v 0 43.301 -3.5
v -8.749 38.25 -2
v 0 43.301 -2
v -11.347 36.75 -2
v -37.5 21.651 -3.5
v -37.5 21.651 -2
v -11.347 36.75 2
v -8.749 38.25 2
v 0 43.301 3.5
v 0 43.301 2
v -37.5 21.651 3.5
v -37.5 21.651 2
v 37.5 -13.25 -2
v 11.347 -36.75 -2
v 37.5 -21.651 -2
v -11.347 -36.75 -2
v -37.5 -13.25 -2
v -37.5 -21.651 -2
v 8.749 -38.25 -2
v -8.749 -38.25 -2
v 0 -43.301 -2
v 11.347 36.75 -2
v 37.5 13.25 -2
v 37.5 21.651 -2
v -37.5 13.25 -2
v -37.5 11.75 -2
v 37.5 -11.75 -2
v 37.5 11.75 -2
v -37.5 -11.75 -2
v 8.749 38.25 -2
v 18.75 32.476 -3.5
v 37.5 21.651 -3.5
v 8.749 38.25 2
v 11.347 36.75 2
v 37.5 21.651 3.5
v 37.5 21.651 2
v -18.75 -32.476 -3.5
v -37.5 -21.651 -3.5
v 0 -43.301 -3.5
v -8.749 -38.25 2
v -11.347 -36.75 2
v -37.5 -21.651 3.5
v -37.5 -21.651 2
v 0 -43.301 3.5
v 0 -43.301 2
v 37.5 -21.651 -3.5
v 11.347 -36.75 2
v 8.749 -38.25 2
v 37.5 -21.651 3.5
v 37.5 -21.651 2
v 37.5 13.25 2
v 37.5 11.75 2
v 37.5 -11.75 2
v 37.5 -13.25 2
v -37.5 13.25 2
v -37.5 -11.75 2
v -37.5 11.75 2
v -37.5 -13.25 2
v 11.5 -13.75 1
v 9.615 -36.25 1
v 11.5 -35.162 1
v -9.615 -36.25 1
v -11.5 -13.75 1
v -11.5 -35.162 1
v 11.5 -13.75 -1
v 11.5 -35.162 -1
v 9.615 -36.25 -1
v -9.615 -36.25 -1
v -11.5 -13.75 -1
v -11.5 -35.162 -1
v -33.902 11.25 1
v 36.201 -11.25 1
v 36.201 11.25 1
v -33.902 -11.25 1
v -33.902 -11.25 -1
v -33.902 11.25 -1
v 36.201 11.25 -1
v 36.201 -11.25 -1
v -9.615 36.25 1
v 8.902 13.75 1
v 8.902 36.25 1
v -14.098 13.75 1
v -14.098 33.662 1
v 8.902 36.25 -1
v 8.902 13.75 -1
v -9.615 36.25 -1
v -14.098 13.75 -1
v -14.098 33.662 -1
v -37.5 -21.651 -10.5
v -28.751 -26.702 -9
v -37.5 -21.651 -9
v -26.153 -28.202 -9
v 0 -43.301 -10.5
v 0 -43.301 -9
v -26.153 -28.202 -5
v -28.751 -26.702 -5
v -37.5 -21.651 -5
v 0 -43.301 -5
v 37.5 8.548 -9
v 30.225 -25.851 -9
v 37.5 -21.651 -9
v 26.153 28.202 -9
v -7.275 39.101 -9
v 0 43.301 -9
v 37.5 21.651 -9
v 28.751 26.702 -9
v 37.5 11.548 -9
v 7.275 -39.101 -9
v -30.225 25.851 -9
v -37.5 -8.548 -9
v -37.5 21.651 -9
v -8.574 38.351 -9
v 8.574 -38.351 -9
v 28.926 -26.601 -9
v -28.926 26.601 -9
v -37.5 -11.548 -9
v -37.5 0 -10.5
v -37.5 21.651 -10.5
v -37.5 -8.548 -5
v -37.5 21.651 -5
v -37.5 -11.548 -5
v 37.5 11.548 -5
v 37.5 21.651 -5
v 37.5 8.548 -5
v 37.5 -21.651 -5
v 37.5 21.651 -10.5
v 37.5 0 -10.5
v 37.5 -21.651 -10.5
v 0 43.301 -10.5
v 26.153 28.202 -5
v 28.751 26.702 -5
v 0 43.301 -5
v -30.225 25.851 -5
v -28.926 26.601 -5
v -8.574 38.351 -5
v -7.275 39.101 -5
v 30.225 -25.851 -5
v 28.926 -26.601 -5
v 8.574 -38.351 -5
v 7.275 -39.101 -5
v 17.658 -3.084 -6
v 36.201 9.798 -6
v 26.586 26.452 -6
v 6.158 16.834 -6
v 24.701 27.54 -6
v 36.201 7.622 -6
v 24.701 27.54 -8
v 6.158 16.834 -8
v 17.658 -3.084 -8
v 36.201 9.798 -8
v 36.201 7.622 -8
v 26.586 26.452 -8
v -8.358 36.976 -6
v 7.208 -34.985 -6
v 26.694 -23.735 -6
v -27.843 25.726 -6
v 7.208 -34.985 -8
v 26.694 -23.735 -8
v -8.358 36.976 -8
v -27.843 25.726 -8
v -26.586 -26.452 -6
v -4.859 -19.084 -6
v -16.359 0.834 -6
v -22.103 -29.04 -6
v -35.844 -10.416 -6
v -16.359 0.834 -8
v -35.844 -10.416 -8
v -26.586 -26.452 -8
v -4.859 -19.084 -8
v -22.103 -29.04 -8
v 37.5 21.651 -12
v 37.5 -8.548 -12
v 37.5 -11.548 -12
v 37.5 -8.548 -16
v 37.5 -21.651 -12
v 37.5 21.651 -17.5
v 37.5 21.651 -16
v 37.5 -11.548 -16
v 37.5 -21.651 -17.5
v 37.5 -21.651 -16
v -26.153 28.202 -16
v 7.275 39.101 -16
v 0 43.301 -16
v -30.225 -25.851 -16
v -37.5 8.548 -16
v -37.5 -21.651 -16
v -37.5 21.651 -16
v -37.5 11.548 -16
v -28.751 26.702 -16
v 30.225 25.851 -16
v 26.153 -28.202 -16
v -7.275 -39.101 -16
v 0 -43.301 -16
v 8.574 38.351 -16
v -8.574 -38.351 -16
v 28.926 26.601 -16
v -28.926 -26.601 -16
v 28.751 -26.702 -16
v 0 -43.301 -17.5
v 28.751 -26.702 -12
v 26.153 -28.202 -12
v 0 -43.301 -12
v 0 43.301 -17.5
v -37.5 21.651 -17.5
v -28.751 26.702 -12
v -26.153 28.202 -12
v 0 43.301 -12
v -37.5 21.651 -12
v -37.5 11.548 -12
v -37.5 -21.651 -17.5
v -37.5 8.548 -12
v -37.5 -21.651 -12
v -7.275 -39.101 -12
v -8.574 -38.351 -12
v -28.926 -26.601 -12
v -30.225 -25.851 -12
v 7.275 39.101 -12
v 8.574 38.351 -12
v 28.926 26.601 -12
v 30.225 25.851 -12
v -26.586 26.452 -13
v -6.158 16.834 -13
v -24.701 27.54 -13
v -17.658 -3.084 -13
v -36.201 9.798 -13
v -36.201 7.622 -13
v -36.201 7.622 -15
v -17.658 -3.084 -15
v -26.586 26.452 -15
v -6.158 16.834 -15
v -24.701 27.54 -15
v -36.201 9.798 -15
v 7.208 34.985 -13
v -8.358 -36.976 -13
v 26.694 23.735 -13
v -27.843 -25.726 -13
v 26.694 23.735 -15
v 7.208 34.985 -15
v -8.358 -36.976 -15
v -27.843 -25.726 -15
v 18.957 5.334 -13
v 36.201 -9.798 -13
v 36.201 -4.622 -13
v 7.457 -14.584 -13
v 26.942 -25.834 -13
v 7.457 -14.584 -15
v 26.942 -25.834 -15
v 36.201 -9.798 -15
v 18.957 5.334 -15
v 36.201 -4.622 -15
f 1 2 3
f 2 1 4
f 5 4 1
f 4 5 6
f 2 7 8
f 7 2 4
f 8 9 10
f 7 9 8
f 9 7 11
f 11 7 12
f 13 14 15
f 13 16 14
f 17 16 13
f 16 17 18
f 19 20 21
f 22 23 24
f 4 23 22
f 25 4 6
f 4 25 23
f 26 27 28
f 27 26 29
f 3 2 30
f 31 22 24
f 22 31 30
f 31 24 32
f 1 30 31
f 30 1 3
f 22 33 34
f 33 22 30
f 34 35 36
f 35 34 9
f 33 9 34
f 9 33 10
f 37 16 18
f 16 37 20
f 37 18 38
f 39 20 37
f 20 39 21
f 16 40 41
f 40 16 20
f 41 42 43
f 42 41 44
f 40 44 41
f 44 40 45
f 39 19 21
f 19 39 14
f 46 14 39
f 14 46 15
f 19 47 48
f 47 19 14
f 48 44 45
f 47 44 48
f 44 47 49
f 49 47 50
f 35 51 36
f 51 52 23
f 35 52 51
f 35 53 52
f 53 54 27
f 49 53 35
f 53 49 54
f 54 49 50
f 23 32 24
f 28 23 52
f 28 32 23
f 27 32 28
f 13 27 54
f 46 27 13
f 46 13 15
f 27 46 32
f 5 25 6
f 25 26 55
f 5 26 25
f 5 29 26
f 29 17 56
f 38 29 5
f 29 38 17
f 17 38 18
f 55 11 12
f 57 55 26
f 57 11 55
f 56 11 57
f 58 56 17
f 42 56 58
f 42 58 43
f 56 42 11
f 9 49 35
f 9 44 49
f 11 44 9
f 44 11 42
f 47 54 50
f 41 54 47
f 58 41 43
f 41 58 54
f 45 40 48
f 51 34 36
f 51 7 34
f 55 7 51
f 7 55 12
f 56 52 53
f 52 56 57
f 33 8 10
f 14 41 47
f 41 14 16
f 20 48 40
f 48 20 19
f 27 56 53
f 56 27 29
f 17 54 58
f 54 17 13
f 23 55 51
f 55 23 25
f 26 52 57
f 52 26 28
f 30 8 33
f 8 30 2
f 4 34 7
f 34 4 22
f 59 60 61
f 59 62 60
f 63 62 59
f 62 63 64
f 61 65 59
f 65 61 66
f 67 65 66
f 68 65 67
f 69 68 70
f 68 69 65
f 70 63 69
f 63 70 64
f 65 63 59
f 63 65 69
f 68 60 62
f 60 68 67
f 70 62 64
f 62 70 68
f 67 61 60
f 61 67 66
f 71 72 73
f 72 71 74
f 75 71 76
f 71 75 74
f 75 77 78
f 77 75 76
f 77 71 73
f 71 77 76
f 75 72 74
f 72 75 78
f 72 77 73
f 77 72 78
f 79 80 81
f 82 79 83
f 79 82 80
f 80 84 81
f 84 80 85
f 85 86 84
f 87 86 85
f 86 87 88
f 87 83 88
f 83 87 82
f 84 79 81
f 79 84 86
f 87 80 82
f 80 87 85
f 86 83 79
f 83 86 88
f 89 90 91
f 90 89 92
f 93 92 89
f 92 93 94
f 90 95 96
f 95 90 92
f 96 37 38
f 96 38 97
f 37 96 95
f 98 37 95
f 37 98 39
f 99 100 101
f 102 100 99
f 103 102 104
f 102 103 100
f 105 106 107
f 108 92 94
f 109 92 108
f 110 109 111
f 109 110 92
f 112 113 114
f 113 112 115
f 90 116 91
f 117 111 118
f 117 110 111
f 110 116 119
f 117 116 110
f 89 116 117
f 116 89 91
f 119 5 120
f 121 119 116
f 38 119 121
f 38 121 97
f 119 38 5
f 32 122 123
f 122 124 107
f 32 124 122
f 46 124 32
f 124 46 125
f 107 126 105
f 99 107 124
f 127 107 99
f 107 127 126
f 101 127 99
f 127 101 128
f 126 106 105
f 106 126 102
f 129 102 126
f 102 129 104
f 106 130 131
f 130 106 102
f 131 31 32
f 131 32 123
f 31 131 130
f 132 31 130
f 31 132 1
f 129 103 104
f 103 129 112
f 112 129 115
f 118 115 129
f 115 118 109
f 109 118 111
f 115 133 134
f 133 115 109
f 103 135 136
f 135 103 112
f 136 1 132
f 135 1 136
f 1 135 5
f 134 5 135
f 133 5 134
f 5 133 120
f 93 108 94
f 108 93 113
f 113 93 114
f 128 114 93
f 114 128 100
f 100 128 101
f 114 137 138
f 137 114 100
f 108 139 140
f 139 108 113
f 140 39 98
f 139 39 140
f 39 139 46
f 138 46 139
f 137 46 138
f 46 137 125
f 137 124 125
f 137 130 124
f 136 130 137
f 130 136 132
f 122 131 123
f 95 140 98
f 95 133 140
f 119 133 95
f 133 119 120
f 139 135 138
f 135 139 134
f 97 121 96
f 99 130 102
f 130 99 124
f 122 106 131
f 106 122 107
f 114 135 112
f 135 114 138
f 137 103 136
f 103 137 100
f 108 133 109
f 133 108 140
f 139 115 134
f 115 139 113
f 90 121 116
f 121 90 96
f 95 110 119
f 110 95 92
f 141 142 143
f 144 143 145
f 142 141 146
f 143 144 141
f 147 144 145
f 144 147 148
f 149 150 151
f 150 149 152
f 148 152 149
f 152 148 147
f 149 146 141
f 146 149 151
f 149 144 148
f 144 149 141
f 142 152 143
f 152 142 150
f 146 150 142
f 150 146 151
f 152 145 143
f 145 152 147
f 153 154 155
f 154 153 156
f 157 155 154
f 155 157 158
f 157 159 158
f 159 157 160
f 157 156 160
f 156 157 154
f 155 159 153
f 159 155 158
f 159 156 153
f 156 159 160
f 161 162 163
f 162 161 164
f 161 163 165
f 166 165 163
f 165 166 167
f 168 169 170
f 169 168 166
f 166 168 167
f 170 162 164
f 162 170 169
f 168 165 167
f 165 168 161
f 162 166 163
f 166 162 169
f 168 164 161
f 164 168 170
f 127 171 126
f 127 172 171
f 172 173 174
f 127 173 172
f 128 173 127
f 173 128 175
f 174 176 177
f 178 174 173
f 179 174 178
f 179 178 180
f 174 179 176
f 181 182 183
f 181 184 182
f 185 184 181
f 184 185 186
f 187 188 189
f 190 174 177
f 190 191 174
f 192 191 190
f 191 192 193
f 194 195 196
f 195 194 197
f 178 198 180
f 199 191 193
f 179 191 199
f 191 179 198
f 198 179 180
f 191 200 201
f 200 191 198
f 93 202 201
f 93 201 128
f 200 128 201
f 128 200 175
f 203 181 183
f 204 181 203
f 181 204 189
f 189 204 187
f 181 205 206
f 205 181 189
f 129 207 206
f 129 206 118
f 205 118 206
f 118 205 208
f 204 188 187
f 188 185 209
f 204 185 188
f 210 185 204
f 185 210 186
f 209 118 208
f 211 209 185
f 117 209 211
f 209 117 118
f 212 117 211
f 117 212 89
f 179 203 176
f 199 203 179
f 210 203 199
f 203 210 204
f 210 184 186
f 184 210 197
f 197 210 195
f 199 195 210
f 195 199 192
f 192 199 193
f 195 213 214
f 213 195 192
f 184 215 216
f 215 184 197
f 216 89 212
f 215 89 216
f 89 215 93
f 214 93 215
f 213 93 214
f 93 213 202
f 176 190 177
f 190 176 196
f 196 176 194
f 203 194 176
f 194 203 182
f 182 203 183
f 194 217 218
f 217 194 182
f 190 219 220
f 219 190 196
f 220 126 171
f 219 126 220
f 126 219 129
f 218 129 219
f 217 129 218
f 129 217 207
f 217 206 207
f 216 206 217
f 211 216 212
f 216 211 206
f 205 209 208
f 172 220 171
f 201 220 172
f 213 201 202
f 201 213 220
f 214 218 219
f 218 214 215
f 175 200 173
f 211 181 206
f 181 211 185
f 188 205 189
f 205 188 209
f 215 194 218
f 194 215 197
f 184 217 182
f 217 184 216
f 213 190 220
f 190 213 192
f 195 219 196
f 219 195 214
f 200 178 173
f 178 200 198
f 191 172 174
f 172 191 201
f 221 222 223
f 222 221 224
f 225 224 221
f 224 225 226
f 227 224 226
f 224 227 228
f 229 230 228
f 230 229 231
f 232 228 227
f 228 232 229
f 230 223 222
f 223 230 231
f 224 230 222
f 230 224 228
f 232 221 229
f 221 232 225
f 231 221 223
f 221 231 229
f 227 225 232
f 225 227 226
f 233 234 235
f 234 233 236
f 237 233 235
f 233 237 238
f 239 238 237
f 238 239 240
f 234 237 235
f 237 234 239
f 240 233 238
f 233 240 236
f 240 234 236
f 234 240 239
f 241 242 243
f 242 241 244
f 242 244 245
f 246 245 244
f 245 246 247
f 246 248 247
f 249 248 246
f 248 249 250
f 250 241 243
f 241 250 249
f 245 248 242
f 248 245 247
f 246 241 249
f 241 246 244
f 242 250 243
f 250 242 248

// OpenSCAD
// =========================================================
// HEX MATRIX N=3 — 54 Shafts, 3 Tiers, 3 Channels/Tier
// =========================================================
// Regular hex, 4 walls per tier, 3 channel gaps per tier.
// Each channel has ONE slider strip with multiple eyelets.
// One cam per channel → 3 cams per helix → 9 cams total.
//
// Per tier:
//   - 4 walls (colored by tier)
//   - 3 slider strips (one per channel gap)
//   - Each strip has eyelets at shaft positions in that channel
//   - Top/bottom hex plates with rope pass-through holes
//
// 3 tiers at 0/120/240 → walls form 54 equilateral triangle shafts.
// Each shaft = 1 block. Block displacement = sum of 3 slider motions.
//
// Cam phases (per helix, 3 cams): 0°, 120°, 240°
// =========================================================

$fn = 36;

// =============================================
// CONTROLS
// =============================================

/* [Display] */
NUM_TIERS       = 3;       // [1:1:3]
TIER_GAP        = 0;       // [0:0.5:20]
SHOW_PLATES     = true;
SHOW_WALLS      = true;
SHOW_SLIDERS    = true;
SHOW_ROPE_HOLES = true;
SHOW_SHAFTS     = false;

/* [Hex Size] */
WALL_SPACING    = 25.0;    // [10:1:80]

/* [Animation] */
MANUAL_POS      = -1;      // [-1:0.01:1]
function anim_t() = (MANUAL_POS >= 0) ? MANUAL_POS : $t;

// =============================================
// DIMENSIONS
// =============================================

LINE_DIA        = 0.3;
WALL_T          = 1.5;
PLATE_T         = 1.5;
SLIDER_BODY     = 2.0;
CH_GAP          = 4.0;
ROPE_HOLE_DIA   = 1.5;
EYELET_DIA      = 1.0;
ECCENTRICITY    = 3.0;
CAM_STROKE      = 2 * ECCENTRICITY;

// =============================================
// HEX GEOMETRY
// =============================================

N_CHANNELS      = 3;
N_WALLS         = N_CHANNELS + 1;           // 4
HEX_FTF         = N_CHANNELS * WALL_SPACING; // 3 × 25 = 75mm
HEX_CORNER_R    = HEX_FTF / 2 / cos(30);
TRI_SIDE        = WALL_SPACING / sin(60);
TRI_INSCRIBED_R = TRI_SIDE / (2 * sqrt(3));

// Cams
CAMS_PER_HELIX  = N_CHANNELS;               // 3
CAMS_TOTAL      = CAMS_PER_HELIX * 3;       // 9
CAM_PHASE_STEP  = 360 / CAMS_PER_HELIX;     // 120°

// =============================================
// TIER
// =============================================

TIER_THICK      = CH_GAP + 2 * PLATE_T;     // 7mm
WALL_H          = CH_GAP;
TIER_PITCH      = TIER_THICK + TIER_GAP;
STACK_TOTAL     = NUM_TIERS * TIER_THICK + (NUM_TIERS - 1) * TIER_GAP;

// =============================================
// SLIDER STRIP DIMENSIONS
// =============================================

STRIP_WIDTH_Y   = WALL_SPACING - WALL_T - 1.0;
STRIP_THICK_Z   = SLIDER_BODY;

// =============================================
// COLORS
// =============================================

C_PLATE   = [0.65, 0.65, 1.0, 0.35];
C_WALL_1  = [1.0, 0.25, 0.25, 0.9];
C_WALL_2  = [0.25, 0.75, 0.25, 0.9];
C_WALL_3  = [0.25, 0.45, 1.0, 0.9];
C_WALLS   = [C_WALL_1, C_WALL_2, C_WALL_3];
C_STRIP_0 = [0.95, 0.55, 0.2, 0.85];
C_STRIP_1 = [0.95, 0.75, 0.2, 0.85];
C_STRIP_2 = [0.85, 0.40, 0.7, 0.85];
C_STRIPS  = [C_STRIP_0, C_STRIP_1, C_STRIP_2];
C_SHAFT   = [1.0, 1.0, 0.3, 0.4];

// =============================================
// SHAFT POSITIONS
// =============================================
// Follow the same pattern as N=2 (hex_matrix_n2.scad):
//   Walls centered symmetrically: wall w at (w - (N_WALLS-1)/2) * WS
//   N=3: walls at -1.5WS, -0.5WS, +0.5WS, +1.5WS
//   Channel centers (strip positions): -WS, 0, +WS
//
// For triangle finding: each channel index maps to a strip center.
// _STRIP_POS[ch] = channel center Y in tier-local coords.

function _perp(a) = [cos(a+90), sin(a+90)];
_D0 = _perp(0);
_D1 = _perp(120);
_D2 = _perp(240);

// Channel center positions (symmetric about 0)
_STRIP_POS = [for (ch = [0 : N_CHANNELS-1]) (ch - (N_CHANNELS-1)/2) * WALL_SPACING];
// N=3: [-25, 0, 25]

// Triangle center for channel indices (s0,s1,s2) and orientation (0 or 1)
// Same math as N=2: shift by ±1/6 WS from channel center
function _tri_center(s0, s1, s2, orient) =
    let(
        shift = ((orient==0) ? 1/3 - 0.5 : 2/3 - 0.5) * WALL_SPACING,
        p0 = _STRIP_POS[s0] + shift,
        p1 = _STRIP_POS[s1] + shift,
        p2 = _STRIP_POS[s2] + shift,
        det = _D0[0]*_D1[1] - _D0[1]*_D1[0],
        x = (p0*_D1[1] - p1*_D0[1]) / det,
        y = (_D0[0]*p1 - _D1[0]*p0) / det,
        p2c = _D2[0]*x + _D2[1]*y
    )
    (abs(p2c - p2) < WALL_SPACING*0.35 && _in_hex(x, y, HEX_CORNER_R - 1))
    ? [x, y] : undef;

function _in_hex(x, y, r) =
    let(f = r*cos(30))
    abs(y) <= f &&
    abs(x*sin(60) + y*cos(60)) <= f &&
    abs(x*sin(60) - y*cos(60)) <= f;

function _all_shafts() =
    let(
        raw = [for (s0=[0:N_CHANNELS-1])
               for (s1=[0:N_CHANNELS-1])
               for (s2=[0:N_CHANNELS-1])
               for (o=[0:1])
                   _tri_center(s0, s1, s2, o)],
        valid = [for (p=raw) if (p != undef) p]
    ) _dedup(valid, WALL_SPACING*0.1);

function _dedup(pts, tol, i=0, acc=[]) =
    i >= len(pts) ? acc :
    _dedup(pts, tol, i+1,
           _near(pts[i], acc, tol) ? acc : concat(acc, [pts[i]]));

function _near(p, arr, tol, j=0) =
    j >= len(arr) ? false :
    norm([p[0]-arr[j][0], p[1]-arr[j][1]]) < tol ? true :
    _near(p, arr, tol, j+1);

SHAFT_POS = _all_shafts();

// 2D rotation helper
function _rot2d(p, a) = [p[0]*cos(a) - p[1]*sin(a),
                          p[0]*sin(a) + p[1]*cos(a)];

// Which channel does a local Y coordinate fall in?
// Walls at: -1.5WS, -0.5WS, +0.5WS, +1.5WS
// CH0: -1.5WS to -0.5WS (center = -WS)
// CH1: -0.5WS to +0.5WS (center = 0)
// CH2: +0.5WS to +1.5WS (center = +WS)
function _which_channel(ly) =
    let(
        shifted = ly + N_CHANNELS * WALL_SPACING / 2,
        ch = floor(shifted / WALL_SPACING)
    )
    max(0, min(N_CHANNELS - 1, ch));

// Channel center Y in local coords
function _ch_center_y(ch) = _STRIP_POS[ch];

// Hex width at a given Y offset from center
function _hex_width_at_y(y) =
    let(
        ay = abs(y),
        ftf_half = HEX_FTF / 2
    )
    (ay > ftf_half) ? 0 :
    2 * (HEX_CORNER_R - ay / cos(30)) * cos(30);

// =============================================
// ECHO
// =============================================

echo(str("=== HEX MATRIX N=3 ==="));
echo(str("Hex: ", HEX_FTF, "mm FTF | ", round(2*HEX_CORNER_R*10)/10, "mm C-C"));
echo(str("Tier: ", TIER_THICK, "mm | Stack: ", STACK_TOTAL, "mm"));
echo(str("Tri side: ", round(TRI_SIDE*10)/10, "mm"));
echo(str("Shafts found: ", len(SHAFT_POS), " (expect 54)"));
echo(str("Channels/tier: ", N_CHANNELS, " | Cams/helix: ", CAMS_PER_HELIX, " | Total cams: ", CAMS_TOTAL));
echo(str("Strip positions: ", _STRIP_POS));
echo(str("Strip: width_Y=", STRIP_WIDTH_Y, " thick_Z=", STRIP_THICK_Z));

// Per-channel shaft count
for (ch = [0 : N_CHANNELS-1]) {
    _count = len([for (p=SHAFT_POS)
        if (_which_channel(p[1]) == ch && _in_hex(p[0], p[1], HEX_CORNER_R-2)) 1]);
    echo(str("Tier 0 — CH", ch, ": ", _count, " shafts (center Y=", _STRIP_POS[ch], ")"));
}

// =============================================
// RENDER
// =============================================

hex_matrix();

module hex_matrix() {
    t = anim_t();

    for (i = [0 : NUM_TIERS-1]) {
        translate([0, 0, -i * TIER_PITCH])
            rotate([0, 0, i * 120])
                hex_tier(i, t);
    }

    // Center axis
    %color("red")
    cylinder(d=1, h=STACK_TOTAL + 20, center=true, $fn=8);

    // Shaft indicators
    if (SHOW_SHAFTS)
        for (p = SHAFT_POS) {
            color(C_SHAFT)
            translate([p[0], p[1], -STACK_TOTAL])
                cylinder(d=0.6, h=STACK_TOTAL + 10, $fn=6);
        }
}

// =============================================
// SINGLE TIER
// =============================================

module hex_tier(tier_idx, t) {

    wall_color = C_WALLS[tier_idx];
    ta = tier_idx * 120;

    // Cam phases: 3 cams, 120° apart on helix
    cam_phase = [for (c = [0 : N_CHANNELS-1]) c * CAM_PHASE_STEP];

    // ---- HEX PLATES with rope holes ----
    if (SHOW_PLATES) {
        for (zs = [-1, 1]) {
            pz = zs * (TIER_THICK/2 - PLATE_T/2);
            difference() {
                color(C_PLATE)
                translate([0, 0, pz])
                    linear_extrude(PLATE_T, center=true)
                        rotate([0, 0, 30])
                            circle(r=HEX_CORNER_R, $fn=6);

                if (SHOW_ROPE_HOLES)
                    for (p = SHAFT_POS) {
                        lp = _rot2d(p, -ta);
                        if (_in_hex(lp[0], lp[1], HEX_CORNER_R-1))
                            translate([lp[0], lp[1], pz])
                                cylinder(d=ROPE_HOLE_DIA, h=PLATE_T+1, center=true, $fn=12);
                    }
            }
        }
    }

    // ---- WALLS (4 per tier, clipped to hex) ----
    // Wall positions: (w - 1.5) * WS → -37.5, -12.5, +12.5, +37.5
    if (SHOW_WALLS) {
        for (w = [0 : N_WALLS-1]) {
            wy = (w - (N_WALLS-1)/2) * WALL_SPACING;

            difference() {
                color(wall_color)
                intersection() {
                    translate([0, wy, 0])
                        cube([HEX_CORNER_R*3, WALL_T, WALL_H], center=true);
                    linear_extrude(WALL_H, center=true)
                        rotate([0, 0, 30])
                            circle(r=HEX_CORNER_R, $fn=6);
                }

                if (SHOW_ROPE_HOLES)
                    for (p = SHAFT_POS) {
                        lp = _rot2d(p, -ta);
                        if (abs(lp[1] - wy) < WALL_SPACING/2 + 1)
                            translate([lp[0], wy, 0])
                                rotate([90, 0, 0])
                                    cylinder(d=ROPE_HOLE_DIA, h=WALL_T+2, center=true, $fn=12);
                    }
            }
        }
    }

    // ---- SLIDER STRIPS (3 per tier, one per channel) ----
    if (SHOW_SLIDERS) {
        for (ch = [0 : N_CHANNELS-1]) {
            ch_y = _ch_center_y(ch);

            // Strip displacement from cam
            disp = ECCENTRICITY * sin(t * 360 + cam_phase[ch]);

            // Hex width at this channel's Y position = strip length
            strip_len = _hex_width_at_y(ch_y) - 2;

            color(C_STRIPS[ch])
            intersection() {
                translate([disp, ch_y, 0])
                    _slider_strip_with_eyelets(strip_len, ch, ta, disp);

                // Clip to hex interior
                linear_extrude(WALL_H, center=true)
                    rotate([0, 0, 30])
                        circle(r=HEX_CORNER_R - WALL_T, $fn=6);
            }
        }
    }
}

// =============================================
// SLIDER STRIP WITH EYELETS
// =============================================

module _slider_strip_with_eyelets(strip_len, ch, tier_angle, disp_x) {
    ch_cy = _ch_center_y(ch);

    difference() {
        cube([strip_len, STRIP_WIDTH_Y, STRIP_THICK_Z], center=true);

        // Eyelets at shaft positions within this channel
        for (p = SHAFT_POS) {
            lp = _rot2d(p, -tier_angle);
            if (_in_hex(lp[0], lp[1], HEX_CORNER_R-2) && _which_channel(lp[1]) == ch) {
                // Strip-local coords: strip origin is at [disp_x, ch_cy] in tier space
                translate([lp[0] - disp_x, lp[1] - ch_cy, 0])
                    cylinder(d=EYELET_DIA, h=STRIP_THICK_Z+1, center=true, $fn=12);
            }
        }
    }
}
